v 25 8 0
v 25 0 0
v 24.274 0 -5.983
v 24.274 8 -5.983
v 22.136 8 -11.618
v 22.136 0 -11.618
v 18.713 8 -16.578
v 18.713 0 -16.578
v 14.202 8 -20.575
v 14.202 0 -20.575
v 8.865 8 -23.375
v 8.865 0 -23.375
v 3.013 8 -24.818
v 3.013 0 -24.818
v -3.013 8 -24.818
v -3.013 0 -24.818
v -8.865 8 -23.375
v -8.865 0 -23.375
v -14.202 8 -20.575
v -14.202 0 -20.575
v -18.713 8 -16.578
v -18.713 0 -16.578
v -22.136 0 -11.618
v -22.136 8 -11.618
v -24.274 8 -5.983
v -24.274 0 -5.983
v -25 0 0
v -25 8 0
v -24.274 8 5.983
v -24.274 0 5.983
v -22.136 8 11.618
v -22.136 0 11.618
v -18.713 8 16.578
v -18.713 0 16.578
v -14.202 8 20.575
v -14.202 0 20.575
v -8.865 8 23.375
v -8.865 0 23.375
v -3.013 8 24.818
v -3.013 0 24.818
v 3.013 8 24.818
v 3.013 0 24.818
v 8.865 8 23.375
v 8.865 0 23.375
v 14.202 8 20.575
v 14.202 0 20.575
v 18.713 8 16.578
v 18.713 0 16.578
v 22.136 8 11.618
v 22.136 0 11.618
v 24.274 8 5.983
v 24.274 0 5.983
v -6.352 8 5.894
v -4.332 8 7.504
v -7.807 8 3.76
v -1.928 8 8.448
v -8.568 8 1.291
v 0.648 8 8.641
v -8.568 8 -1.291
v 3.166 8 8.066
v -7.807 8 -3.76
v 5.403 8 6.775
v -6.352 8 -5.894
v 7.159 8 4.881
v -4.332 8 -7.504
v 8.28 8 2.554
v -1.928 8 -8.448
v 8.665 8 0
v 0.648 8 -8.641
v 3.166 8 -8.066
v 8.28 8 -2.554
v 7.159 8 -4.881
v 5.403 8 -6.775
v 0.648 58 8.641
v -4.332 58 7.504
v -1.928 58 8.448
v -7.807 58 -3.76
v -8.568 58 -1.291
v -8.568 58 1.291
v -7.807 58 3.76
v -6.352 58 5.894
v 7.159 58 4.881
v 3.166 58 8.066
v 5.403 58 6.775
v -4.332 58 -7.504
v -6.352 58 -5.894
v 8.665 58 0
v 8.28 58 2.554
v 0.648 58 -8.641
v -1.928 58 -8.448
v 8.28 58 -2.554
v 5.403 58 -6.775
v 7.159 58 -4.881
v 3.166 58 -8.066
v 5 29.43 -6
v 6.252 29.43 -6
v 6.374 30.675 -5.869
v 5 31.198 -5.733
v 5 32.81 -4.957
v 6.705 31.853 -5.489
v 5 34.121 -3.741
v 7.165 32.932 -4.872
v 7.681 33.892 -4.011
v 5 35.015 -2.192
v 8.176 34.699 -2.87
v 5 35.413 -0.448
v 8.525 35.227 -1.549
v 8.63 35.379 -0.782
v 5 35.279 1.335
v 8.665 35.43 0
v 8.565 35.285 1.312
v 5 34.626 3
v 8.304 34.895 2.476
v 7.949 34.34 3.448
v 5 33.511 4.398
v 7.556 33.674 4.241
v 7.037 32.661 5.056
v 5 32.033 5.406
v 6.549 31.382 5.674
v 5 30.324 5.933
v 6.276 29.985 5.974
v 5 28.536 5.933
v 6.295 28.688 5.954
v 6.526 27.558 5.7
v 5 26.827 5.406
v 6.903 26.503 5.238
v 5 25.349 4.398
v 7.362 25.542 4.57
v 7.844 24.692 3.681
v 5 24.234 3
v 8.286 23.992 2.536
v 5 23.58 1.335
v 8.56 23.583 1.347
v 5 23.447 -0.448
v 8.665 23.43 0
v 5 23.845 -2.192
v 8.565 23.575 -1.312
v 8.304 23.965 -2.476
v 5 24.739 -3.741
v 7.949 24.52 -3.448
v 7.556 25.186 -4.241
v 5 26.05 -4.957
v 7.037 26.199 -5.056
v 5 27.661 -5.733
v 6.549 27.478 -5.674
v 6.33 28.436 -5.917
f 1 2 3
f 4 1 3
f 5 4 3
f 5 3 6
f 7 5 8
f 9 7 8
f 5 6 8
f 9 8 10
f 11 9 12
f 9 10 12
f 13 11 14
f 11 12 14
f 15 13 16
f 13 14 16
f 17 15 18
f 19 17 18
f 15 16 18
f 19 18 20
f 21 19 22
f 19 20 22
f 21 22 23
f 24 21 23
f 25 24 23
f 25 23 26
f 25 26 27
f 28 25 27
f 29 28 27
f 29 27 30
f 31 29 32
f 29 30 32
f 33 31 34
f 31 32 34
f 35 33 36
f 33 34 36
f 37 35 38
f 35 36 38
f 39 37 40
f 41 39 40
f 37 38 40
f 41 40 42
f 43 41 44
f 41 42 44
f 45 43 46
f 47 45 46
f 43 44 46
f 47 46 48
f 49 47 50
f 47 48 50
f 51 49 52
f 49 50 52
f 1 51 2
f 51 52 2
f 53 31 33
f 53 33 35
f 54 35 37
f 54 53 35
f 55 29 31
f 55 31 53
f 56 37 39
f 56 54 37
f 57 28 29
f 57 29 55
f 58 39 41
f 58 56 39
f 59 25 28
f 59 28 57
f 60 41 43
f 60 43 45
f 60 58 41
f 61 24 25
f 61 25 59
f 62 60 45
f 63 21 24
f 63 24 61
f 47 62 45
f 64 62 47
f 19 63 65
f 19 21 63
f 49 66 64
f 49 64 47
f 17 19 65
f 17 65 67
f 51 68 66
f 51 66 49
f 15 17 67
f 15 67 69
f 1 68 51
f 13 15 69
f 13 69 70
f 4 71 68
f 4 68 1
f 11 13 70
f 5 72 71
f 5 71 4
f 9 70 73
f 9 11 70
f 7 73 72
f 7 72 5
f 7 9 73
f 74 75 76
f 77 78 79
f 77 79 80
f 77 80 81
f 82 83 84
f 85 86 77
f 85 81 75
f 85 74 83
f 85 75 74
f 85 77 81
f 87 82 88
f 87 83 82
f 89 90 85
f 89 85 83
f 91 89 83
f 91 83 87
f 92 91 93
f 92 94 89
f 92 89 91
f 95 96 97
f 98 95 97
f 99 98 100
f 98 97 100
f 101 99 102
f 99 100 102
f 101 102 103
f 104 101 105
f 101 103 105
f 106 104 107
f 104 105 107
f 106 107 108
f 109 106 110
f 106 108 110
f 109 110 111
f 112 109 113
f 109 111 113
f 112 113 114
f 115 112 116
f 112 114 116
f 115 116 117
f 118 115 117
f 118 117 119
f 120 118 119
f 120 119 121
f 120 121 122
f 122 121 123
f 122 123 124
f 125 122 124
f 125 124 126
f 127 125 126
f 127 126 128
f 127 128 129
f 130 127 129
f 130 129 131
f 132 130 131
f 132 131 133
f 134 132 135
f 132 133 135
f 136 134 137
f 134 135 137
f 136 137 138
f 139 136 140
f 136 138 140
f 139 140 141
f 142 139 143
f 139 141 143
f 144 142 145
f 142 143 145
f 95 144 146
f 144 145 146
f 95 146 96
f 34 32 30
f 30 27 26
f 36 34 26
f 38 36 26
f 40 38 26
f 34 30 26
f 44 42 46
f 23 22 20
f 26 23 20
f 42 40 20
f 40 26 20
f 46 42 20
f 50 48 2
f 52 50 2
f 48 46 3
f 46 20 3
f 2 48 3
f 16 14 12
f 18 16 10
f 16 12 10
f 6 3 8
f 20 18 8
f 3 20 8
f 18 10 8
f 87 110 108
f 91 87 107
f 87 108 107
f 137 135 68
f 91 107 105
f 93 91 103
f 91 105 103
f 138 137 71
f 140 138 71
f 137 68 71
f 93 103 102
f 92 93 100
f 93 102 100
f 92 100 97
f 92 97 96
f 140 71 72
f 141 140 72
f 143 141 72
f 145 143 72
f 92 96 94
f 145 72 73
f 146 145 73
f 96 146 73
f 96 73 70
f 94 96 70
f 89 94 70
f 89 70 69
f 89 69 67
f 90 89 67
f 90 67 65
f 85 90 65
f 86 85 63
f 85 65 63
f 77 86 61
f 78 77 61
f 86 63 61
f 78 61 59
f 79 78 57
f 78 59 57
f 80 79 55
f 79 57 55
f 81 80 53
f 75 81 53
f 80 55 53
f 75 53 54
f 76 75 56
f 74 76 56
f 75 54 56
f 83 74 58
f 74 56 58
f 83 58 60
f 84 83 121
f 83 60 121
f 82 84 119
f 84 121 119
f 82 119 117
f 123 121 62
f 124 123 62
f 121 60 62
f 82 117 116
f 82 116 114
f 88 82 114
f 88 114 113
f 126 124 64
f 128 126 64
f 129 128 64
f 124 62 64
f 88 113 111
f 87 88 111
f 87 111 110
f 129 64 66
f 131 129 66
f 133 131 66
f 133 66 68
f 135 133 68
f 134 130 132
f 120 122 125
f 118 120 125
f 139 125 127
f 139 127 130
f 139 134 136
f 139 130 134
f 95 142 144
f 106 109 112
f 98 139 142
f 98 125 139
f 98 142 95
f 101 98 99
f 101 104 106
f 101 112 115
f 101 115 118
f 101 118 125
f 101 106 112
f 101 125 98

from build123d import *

# Parameters (mm, degrees)
SKETCH1_R           = 25
BOSS_EXTRUDE1_DEPTH = 8
SKETCH2_R           = 8.664977056
BOSS_EXTRUDE2_DEPTH = 50
SKETCH3_R           = 6
CUT_EXTRUDE1_DEPTH  = 15


with BuildPart() as part:
    # Sketch1 → Boss-Extrude1 (new body)
    with BuildSketch(Plane(origin=(0, 0, 0), x_dir=(1, 0, 0), z_dir=(0, 1, 0))):
        Circle(SKETCH1_R)
    extrude(amount=BOSS_EXTRUDE1_DEPTH)

    # Sketch2 → Boss-Extrude2 (add)
    with BuildSketch(Plane(origin=(0, 8, 0), x_dir=(1, 0, 0), z_dir=(0, 1, 0))):
        Circle(SKETCH2_R)
    extrude(amount=BOSS_EXTRUDE2_DEPTH)

    # Sketch3 → Cut-Extrude1 (cut)
    with BuildSketch(Plane(origin=(20, 0, 0), x_dir=(0, 0, -1), z_dir=(1, 0, 0))):
        with Locations((0, 29.42990961)):
            Circle(SKETCH3_R)
    extrude(amount=-CUT_EXTRUDE1_DEPTH, mode=Mode.SUBTRACT)


solid = part.part
